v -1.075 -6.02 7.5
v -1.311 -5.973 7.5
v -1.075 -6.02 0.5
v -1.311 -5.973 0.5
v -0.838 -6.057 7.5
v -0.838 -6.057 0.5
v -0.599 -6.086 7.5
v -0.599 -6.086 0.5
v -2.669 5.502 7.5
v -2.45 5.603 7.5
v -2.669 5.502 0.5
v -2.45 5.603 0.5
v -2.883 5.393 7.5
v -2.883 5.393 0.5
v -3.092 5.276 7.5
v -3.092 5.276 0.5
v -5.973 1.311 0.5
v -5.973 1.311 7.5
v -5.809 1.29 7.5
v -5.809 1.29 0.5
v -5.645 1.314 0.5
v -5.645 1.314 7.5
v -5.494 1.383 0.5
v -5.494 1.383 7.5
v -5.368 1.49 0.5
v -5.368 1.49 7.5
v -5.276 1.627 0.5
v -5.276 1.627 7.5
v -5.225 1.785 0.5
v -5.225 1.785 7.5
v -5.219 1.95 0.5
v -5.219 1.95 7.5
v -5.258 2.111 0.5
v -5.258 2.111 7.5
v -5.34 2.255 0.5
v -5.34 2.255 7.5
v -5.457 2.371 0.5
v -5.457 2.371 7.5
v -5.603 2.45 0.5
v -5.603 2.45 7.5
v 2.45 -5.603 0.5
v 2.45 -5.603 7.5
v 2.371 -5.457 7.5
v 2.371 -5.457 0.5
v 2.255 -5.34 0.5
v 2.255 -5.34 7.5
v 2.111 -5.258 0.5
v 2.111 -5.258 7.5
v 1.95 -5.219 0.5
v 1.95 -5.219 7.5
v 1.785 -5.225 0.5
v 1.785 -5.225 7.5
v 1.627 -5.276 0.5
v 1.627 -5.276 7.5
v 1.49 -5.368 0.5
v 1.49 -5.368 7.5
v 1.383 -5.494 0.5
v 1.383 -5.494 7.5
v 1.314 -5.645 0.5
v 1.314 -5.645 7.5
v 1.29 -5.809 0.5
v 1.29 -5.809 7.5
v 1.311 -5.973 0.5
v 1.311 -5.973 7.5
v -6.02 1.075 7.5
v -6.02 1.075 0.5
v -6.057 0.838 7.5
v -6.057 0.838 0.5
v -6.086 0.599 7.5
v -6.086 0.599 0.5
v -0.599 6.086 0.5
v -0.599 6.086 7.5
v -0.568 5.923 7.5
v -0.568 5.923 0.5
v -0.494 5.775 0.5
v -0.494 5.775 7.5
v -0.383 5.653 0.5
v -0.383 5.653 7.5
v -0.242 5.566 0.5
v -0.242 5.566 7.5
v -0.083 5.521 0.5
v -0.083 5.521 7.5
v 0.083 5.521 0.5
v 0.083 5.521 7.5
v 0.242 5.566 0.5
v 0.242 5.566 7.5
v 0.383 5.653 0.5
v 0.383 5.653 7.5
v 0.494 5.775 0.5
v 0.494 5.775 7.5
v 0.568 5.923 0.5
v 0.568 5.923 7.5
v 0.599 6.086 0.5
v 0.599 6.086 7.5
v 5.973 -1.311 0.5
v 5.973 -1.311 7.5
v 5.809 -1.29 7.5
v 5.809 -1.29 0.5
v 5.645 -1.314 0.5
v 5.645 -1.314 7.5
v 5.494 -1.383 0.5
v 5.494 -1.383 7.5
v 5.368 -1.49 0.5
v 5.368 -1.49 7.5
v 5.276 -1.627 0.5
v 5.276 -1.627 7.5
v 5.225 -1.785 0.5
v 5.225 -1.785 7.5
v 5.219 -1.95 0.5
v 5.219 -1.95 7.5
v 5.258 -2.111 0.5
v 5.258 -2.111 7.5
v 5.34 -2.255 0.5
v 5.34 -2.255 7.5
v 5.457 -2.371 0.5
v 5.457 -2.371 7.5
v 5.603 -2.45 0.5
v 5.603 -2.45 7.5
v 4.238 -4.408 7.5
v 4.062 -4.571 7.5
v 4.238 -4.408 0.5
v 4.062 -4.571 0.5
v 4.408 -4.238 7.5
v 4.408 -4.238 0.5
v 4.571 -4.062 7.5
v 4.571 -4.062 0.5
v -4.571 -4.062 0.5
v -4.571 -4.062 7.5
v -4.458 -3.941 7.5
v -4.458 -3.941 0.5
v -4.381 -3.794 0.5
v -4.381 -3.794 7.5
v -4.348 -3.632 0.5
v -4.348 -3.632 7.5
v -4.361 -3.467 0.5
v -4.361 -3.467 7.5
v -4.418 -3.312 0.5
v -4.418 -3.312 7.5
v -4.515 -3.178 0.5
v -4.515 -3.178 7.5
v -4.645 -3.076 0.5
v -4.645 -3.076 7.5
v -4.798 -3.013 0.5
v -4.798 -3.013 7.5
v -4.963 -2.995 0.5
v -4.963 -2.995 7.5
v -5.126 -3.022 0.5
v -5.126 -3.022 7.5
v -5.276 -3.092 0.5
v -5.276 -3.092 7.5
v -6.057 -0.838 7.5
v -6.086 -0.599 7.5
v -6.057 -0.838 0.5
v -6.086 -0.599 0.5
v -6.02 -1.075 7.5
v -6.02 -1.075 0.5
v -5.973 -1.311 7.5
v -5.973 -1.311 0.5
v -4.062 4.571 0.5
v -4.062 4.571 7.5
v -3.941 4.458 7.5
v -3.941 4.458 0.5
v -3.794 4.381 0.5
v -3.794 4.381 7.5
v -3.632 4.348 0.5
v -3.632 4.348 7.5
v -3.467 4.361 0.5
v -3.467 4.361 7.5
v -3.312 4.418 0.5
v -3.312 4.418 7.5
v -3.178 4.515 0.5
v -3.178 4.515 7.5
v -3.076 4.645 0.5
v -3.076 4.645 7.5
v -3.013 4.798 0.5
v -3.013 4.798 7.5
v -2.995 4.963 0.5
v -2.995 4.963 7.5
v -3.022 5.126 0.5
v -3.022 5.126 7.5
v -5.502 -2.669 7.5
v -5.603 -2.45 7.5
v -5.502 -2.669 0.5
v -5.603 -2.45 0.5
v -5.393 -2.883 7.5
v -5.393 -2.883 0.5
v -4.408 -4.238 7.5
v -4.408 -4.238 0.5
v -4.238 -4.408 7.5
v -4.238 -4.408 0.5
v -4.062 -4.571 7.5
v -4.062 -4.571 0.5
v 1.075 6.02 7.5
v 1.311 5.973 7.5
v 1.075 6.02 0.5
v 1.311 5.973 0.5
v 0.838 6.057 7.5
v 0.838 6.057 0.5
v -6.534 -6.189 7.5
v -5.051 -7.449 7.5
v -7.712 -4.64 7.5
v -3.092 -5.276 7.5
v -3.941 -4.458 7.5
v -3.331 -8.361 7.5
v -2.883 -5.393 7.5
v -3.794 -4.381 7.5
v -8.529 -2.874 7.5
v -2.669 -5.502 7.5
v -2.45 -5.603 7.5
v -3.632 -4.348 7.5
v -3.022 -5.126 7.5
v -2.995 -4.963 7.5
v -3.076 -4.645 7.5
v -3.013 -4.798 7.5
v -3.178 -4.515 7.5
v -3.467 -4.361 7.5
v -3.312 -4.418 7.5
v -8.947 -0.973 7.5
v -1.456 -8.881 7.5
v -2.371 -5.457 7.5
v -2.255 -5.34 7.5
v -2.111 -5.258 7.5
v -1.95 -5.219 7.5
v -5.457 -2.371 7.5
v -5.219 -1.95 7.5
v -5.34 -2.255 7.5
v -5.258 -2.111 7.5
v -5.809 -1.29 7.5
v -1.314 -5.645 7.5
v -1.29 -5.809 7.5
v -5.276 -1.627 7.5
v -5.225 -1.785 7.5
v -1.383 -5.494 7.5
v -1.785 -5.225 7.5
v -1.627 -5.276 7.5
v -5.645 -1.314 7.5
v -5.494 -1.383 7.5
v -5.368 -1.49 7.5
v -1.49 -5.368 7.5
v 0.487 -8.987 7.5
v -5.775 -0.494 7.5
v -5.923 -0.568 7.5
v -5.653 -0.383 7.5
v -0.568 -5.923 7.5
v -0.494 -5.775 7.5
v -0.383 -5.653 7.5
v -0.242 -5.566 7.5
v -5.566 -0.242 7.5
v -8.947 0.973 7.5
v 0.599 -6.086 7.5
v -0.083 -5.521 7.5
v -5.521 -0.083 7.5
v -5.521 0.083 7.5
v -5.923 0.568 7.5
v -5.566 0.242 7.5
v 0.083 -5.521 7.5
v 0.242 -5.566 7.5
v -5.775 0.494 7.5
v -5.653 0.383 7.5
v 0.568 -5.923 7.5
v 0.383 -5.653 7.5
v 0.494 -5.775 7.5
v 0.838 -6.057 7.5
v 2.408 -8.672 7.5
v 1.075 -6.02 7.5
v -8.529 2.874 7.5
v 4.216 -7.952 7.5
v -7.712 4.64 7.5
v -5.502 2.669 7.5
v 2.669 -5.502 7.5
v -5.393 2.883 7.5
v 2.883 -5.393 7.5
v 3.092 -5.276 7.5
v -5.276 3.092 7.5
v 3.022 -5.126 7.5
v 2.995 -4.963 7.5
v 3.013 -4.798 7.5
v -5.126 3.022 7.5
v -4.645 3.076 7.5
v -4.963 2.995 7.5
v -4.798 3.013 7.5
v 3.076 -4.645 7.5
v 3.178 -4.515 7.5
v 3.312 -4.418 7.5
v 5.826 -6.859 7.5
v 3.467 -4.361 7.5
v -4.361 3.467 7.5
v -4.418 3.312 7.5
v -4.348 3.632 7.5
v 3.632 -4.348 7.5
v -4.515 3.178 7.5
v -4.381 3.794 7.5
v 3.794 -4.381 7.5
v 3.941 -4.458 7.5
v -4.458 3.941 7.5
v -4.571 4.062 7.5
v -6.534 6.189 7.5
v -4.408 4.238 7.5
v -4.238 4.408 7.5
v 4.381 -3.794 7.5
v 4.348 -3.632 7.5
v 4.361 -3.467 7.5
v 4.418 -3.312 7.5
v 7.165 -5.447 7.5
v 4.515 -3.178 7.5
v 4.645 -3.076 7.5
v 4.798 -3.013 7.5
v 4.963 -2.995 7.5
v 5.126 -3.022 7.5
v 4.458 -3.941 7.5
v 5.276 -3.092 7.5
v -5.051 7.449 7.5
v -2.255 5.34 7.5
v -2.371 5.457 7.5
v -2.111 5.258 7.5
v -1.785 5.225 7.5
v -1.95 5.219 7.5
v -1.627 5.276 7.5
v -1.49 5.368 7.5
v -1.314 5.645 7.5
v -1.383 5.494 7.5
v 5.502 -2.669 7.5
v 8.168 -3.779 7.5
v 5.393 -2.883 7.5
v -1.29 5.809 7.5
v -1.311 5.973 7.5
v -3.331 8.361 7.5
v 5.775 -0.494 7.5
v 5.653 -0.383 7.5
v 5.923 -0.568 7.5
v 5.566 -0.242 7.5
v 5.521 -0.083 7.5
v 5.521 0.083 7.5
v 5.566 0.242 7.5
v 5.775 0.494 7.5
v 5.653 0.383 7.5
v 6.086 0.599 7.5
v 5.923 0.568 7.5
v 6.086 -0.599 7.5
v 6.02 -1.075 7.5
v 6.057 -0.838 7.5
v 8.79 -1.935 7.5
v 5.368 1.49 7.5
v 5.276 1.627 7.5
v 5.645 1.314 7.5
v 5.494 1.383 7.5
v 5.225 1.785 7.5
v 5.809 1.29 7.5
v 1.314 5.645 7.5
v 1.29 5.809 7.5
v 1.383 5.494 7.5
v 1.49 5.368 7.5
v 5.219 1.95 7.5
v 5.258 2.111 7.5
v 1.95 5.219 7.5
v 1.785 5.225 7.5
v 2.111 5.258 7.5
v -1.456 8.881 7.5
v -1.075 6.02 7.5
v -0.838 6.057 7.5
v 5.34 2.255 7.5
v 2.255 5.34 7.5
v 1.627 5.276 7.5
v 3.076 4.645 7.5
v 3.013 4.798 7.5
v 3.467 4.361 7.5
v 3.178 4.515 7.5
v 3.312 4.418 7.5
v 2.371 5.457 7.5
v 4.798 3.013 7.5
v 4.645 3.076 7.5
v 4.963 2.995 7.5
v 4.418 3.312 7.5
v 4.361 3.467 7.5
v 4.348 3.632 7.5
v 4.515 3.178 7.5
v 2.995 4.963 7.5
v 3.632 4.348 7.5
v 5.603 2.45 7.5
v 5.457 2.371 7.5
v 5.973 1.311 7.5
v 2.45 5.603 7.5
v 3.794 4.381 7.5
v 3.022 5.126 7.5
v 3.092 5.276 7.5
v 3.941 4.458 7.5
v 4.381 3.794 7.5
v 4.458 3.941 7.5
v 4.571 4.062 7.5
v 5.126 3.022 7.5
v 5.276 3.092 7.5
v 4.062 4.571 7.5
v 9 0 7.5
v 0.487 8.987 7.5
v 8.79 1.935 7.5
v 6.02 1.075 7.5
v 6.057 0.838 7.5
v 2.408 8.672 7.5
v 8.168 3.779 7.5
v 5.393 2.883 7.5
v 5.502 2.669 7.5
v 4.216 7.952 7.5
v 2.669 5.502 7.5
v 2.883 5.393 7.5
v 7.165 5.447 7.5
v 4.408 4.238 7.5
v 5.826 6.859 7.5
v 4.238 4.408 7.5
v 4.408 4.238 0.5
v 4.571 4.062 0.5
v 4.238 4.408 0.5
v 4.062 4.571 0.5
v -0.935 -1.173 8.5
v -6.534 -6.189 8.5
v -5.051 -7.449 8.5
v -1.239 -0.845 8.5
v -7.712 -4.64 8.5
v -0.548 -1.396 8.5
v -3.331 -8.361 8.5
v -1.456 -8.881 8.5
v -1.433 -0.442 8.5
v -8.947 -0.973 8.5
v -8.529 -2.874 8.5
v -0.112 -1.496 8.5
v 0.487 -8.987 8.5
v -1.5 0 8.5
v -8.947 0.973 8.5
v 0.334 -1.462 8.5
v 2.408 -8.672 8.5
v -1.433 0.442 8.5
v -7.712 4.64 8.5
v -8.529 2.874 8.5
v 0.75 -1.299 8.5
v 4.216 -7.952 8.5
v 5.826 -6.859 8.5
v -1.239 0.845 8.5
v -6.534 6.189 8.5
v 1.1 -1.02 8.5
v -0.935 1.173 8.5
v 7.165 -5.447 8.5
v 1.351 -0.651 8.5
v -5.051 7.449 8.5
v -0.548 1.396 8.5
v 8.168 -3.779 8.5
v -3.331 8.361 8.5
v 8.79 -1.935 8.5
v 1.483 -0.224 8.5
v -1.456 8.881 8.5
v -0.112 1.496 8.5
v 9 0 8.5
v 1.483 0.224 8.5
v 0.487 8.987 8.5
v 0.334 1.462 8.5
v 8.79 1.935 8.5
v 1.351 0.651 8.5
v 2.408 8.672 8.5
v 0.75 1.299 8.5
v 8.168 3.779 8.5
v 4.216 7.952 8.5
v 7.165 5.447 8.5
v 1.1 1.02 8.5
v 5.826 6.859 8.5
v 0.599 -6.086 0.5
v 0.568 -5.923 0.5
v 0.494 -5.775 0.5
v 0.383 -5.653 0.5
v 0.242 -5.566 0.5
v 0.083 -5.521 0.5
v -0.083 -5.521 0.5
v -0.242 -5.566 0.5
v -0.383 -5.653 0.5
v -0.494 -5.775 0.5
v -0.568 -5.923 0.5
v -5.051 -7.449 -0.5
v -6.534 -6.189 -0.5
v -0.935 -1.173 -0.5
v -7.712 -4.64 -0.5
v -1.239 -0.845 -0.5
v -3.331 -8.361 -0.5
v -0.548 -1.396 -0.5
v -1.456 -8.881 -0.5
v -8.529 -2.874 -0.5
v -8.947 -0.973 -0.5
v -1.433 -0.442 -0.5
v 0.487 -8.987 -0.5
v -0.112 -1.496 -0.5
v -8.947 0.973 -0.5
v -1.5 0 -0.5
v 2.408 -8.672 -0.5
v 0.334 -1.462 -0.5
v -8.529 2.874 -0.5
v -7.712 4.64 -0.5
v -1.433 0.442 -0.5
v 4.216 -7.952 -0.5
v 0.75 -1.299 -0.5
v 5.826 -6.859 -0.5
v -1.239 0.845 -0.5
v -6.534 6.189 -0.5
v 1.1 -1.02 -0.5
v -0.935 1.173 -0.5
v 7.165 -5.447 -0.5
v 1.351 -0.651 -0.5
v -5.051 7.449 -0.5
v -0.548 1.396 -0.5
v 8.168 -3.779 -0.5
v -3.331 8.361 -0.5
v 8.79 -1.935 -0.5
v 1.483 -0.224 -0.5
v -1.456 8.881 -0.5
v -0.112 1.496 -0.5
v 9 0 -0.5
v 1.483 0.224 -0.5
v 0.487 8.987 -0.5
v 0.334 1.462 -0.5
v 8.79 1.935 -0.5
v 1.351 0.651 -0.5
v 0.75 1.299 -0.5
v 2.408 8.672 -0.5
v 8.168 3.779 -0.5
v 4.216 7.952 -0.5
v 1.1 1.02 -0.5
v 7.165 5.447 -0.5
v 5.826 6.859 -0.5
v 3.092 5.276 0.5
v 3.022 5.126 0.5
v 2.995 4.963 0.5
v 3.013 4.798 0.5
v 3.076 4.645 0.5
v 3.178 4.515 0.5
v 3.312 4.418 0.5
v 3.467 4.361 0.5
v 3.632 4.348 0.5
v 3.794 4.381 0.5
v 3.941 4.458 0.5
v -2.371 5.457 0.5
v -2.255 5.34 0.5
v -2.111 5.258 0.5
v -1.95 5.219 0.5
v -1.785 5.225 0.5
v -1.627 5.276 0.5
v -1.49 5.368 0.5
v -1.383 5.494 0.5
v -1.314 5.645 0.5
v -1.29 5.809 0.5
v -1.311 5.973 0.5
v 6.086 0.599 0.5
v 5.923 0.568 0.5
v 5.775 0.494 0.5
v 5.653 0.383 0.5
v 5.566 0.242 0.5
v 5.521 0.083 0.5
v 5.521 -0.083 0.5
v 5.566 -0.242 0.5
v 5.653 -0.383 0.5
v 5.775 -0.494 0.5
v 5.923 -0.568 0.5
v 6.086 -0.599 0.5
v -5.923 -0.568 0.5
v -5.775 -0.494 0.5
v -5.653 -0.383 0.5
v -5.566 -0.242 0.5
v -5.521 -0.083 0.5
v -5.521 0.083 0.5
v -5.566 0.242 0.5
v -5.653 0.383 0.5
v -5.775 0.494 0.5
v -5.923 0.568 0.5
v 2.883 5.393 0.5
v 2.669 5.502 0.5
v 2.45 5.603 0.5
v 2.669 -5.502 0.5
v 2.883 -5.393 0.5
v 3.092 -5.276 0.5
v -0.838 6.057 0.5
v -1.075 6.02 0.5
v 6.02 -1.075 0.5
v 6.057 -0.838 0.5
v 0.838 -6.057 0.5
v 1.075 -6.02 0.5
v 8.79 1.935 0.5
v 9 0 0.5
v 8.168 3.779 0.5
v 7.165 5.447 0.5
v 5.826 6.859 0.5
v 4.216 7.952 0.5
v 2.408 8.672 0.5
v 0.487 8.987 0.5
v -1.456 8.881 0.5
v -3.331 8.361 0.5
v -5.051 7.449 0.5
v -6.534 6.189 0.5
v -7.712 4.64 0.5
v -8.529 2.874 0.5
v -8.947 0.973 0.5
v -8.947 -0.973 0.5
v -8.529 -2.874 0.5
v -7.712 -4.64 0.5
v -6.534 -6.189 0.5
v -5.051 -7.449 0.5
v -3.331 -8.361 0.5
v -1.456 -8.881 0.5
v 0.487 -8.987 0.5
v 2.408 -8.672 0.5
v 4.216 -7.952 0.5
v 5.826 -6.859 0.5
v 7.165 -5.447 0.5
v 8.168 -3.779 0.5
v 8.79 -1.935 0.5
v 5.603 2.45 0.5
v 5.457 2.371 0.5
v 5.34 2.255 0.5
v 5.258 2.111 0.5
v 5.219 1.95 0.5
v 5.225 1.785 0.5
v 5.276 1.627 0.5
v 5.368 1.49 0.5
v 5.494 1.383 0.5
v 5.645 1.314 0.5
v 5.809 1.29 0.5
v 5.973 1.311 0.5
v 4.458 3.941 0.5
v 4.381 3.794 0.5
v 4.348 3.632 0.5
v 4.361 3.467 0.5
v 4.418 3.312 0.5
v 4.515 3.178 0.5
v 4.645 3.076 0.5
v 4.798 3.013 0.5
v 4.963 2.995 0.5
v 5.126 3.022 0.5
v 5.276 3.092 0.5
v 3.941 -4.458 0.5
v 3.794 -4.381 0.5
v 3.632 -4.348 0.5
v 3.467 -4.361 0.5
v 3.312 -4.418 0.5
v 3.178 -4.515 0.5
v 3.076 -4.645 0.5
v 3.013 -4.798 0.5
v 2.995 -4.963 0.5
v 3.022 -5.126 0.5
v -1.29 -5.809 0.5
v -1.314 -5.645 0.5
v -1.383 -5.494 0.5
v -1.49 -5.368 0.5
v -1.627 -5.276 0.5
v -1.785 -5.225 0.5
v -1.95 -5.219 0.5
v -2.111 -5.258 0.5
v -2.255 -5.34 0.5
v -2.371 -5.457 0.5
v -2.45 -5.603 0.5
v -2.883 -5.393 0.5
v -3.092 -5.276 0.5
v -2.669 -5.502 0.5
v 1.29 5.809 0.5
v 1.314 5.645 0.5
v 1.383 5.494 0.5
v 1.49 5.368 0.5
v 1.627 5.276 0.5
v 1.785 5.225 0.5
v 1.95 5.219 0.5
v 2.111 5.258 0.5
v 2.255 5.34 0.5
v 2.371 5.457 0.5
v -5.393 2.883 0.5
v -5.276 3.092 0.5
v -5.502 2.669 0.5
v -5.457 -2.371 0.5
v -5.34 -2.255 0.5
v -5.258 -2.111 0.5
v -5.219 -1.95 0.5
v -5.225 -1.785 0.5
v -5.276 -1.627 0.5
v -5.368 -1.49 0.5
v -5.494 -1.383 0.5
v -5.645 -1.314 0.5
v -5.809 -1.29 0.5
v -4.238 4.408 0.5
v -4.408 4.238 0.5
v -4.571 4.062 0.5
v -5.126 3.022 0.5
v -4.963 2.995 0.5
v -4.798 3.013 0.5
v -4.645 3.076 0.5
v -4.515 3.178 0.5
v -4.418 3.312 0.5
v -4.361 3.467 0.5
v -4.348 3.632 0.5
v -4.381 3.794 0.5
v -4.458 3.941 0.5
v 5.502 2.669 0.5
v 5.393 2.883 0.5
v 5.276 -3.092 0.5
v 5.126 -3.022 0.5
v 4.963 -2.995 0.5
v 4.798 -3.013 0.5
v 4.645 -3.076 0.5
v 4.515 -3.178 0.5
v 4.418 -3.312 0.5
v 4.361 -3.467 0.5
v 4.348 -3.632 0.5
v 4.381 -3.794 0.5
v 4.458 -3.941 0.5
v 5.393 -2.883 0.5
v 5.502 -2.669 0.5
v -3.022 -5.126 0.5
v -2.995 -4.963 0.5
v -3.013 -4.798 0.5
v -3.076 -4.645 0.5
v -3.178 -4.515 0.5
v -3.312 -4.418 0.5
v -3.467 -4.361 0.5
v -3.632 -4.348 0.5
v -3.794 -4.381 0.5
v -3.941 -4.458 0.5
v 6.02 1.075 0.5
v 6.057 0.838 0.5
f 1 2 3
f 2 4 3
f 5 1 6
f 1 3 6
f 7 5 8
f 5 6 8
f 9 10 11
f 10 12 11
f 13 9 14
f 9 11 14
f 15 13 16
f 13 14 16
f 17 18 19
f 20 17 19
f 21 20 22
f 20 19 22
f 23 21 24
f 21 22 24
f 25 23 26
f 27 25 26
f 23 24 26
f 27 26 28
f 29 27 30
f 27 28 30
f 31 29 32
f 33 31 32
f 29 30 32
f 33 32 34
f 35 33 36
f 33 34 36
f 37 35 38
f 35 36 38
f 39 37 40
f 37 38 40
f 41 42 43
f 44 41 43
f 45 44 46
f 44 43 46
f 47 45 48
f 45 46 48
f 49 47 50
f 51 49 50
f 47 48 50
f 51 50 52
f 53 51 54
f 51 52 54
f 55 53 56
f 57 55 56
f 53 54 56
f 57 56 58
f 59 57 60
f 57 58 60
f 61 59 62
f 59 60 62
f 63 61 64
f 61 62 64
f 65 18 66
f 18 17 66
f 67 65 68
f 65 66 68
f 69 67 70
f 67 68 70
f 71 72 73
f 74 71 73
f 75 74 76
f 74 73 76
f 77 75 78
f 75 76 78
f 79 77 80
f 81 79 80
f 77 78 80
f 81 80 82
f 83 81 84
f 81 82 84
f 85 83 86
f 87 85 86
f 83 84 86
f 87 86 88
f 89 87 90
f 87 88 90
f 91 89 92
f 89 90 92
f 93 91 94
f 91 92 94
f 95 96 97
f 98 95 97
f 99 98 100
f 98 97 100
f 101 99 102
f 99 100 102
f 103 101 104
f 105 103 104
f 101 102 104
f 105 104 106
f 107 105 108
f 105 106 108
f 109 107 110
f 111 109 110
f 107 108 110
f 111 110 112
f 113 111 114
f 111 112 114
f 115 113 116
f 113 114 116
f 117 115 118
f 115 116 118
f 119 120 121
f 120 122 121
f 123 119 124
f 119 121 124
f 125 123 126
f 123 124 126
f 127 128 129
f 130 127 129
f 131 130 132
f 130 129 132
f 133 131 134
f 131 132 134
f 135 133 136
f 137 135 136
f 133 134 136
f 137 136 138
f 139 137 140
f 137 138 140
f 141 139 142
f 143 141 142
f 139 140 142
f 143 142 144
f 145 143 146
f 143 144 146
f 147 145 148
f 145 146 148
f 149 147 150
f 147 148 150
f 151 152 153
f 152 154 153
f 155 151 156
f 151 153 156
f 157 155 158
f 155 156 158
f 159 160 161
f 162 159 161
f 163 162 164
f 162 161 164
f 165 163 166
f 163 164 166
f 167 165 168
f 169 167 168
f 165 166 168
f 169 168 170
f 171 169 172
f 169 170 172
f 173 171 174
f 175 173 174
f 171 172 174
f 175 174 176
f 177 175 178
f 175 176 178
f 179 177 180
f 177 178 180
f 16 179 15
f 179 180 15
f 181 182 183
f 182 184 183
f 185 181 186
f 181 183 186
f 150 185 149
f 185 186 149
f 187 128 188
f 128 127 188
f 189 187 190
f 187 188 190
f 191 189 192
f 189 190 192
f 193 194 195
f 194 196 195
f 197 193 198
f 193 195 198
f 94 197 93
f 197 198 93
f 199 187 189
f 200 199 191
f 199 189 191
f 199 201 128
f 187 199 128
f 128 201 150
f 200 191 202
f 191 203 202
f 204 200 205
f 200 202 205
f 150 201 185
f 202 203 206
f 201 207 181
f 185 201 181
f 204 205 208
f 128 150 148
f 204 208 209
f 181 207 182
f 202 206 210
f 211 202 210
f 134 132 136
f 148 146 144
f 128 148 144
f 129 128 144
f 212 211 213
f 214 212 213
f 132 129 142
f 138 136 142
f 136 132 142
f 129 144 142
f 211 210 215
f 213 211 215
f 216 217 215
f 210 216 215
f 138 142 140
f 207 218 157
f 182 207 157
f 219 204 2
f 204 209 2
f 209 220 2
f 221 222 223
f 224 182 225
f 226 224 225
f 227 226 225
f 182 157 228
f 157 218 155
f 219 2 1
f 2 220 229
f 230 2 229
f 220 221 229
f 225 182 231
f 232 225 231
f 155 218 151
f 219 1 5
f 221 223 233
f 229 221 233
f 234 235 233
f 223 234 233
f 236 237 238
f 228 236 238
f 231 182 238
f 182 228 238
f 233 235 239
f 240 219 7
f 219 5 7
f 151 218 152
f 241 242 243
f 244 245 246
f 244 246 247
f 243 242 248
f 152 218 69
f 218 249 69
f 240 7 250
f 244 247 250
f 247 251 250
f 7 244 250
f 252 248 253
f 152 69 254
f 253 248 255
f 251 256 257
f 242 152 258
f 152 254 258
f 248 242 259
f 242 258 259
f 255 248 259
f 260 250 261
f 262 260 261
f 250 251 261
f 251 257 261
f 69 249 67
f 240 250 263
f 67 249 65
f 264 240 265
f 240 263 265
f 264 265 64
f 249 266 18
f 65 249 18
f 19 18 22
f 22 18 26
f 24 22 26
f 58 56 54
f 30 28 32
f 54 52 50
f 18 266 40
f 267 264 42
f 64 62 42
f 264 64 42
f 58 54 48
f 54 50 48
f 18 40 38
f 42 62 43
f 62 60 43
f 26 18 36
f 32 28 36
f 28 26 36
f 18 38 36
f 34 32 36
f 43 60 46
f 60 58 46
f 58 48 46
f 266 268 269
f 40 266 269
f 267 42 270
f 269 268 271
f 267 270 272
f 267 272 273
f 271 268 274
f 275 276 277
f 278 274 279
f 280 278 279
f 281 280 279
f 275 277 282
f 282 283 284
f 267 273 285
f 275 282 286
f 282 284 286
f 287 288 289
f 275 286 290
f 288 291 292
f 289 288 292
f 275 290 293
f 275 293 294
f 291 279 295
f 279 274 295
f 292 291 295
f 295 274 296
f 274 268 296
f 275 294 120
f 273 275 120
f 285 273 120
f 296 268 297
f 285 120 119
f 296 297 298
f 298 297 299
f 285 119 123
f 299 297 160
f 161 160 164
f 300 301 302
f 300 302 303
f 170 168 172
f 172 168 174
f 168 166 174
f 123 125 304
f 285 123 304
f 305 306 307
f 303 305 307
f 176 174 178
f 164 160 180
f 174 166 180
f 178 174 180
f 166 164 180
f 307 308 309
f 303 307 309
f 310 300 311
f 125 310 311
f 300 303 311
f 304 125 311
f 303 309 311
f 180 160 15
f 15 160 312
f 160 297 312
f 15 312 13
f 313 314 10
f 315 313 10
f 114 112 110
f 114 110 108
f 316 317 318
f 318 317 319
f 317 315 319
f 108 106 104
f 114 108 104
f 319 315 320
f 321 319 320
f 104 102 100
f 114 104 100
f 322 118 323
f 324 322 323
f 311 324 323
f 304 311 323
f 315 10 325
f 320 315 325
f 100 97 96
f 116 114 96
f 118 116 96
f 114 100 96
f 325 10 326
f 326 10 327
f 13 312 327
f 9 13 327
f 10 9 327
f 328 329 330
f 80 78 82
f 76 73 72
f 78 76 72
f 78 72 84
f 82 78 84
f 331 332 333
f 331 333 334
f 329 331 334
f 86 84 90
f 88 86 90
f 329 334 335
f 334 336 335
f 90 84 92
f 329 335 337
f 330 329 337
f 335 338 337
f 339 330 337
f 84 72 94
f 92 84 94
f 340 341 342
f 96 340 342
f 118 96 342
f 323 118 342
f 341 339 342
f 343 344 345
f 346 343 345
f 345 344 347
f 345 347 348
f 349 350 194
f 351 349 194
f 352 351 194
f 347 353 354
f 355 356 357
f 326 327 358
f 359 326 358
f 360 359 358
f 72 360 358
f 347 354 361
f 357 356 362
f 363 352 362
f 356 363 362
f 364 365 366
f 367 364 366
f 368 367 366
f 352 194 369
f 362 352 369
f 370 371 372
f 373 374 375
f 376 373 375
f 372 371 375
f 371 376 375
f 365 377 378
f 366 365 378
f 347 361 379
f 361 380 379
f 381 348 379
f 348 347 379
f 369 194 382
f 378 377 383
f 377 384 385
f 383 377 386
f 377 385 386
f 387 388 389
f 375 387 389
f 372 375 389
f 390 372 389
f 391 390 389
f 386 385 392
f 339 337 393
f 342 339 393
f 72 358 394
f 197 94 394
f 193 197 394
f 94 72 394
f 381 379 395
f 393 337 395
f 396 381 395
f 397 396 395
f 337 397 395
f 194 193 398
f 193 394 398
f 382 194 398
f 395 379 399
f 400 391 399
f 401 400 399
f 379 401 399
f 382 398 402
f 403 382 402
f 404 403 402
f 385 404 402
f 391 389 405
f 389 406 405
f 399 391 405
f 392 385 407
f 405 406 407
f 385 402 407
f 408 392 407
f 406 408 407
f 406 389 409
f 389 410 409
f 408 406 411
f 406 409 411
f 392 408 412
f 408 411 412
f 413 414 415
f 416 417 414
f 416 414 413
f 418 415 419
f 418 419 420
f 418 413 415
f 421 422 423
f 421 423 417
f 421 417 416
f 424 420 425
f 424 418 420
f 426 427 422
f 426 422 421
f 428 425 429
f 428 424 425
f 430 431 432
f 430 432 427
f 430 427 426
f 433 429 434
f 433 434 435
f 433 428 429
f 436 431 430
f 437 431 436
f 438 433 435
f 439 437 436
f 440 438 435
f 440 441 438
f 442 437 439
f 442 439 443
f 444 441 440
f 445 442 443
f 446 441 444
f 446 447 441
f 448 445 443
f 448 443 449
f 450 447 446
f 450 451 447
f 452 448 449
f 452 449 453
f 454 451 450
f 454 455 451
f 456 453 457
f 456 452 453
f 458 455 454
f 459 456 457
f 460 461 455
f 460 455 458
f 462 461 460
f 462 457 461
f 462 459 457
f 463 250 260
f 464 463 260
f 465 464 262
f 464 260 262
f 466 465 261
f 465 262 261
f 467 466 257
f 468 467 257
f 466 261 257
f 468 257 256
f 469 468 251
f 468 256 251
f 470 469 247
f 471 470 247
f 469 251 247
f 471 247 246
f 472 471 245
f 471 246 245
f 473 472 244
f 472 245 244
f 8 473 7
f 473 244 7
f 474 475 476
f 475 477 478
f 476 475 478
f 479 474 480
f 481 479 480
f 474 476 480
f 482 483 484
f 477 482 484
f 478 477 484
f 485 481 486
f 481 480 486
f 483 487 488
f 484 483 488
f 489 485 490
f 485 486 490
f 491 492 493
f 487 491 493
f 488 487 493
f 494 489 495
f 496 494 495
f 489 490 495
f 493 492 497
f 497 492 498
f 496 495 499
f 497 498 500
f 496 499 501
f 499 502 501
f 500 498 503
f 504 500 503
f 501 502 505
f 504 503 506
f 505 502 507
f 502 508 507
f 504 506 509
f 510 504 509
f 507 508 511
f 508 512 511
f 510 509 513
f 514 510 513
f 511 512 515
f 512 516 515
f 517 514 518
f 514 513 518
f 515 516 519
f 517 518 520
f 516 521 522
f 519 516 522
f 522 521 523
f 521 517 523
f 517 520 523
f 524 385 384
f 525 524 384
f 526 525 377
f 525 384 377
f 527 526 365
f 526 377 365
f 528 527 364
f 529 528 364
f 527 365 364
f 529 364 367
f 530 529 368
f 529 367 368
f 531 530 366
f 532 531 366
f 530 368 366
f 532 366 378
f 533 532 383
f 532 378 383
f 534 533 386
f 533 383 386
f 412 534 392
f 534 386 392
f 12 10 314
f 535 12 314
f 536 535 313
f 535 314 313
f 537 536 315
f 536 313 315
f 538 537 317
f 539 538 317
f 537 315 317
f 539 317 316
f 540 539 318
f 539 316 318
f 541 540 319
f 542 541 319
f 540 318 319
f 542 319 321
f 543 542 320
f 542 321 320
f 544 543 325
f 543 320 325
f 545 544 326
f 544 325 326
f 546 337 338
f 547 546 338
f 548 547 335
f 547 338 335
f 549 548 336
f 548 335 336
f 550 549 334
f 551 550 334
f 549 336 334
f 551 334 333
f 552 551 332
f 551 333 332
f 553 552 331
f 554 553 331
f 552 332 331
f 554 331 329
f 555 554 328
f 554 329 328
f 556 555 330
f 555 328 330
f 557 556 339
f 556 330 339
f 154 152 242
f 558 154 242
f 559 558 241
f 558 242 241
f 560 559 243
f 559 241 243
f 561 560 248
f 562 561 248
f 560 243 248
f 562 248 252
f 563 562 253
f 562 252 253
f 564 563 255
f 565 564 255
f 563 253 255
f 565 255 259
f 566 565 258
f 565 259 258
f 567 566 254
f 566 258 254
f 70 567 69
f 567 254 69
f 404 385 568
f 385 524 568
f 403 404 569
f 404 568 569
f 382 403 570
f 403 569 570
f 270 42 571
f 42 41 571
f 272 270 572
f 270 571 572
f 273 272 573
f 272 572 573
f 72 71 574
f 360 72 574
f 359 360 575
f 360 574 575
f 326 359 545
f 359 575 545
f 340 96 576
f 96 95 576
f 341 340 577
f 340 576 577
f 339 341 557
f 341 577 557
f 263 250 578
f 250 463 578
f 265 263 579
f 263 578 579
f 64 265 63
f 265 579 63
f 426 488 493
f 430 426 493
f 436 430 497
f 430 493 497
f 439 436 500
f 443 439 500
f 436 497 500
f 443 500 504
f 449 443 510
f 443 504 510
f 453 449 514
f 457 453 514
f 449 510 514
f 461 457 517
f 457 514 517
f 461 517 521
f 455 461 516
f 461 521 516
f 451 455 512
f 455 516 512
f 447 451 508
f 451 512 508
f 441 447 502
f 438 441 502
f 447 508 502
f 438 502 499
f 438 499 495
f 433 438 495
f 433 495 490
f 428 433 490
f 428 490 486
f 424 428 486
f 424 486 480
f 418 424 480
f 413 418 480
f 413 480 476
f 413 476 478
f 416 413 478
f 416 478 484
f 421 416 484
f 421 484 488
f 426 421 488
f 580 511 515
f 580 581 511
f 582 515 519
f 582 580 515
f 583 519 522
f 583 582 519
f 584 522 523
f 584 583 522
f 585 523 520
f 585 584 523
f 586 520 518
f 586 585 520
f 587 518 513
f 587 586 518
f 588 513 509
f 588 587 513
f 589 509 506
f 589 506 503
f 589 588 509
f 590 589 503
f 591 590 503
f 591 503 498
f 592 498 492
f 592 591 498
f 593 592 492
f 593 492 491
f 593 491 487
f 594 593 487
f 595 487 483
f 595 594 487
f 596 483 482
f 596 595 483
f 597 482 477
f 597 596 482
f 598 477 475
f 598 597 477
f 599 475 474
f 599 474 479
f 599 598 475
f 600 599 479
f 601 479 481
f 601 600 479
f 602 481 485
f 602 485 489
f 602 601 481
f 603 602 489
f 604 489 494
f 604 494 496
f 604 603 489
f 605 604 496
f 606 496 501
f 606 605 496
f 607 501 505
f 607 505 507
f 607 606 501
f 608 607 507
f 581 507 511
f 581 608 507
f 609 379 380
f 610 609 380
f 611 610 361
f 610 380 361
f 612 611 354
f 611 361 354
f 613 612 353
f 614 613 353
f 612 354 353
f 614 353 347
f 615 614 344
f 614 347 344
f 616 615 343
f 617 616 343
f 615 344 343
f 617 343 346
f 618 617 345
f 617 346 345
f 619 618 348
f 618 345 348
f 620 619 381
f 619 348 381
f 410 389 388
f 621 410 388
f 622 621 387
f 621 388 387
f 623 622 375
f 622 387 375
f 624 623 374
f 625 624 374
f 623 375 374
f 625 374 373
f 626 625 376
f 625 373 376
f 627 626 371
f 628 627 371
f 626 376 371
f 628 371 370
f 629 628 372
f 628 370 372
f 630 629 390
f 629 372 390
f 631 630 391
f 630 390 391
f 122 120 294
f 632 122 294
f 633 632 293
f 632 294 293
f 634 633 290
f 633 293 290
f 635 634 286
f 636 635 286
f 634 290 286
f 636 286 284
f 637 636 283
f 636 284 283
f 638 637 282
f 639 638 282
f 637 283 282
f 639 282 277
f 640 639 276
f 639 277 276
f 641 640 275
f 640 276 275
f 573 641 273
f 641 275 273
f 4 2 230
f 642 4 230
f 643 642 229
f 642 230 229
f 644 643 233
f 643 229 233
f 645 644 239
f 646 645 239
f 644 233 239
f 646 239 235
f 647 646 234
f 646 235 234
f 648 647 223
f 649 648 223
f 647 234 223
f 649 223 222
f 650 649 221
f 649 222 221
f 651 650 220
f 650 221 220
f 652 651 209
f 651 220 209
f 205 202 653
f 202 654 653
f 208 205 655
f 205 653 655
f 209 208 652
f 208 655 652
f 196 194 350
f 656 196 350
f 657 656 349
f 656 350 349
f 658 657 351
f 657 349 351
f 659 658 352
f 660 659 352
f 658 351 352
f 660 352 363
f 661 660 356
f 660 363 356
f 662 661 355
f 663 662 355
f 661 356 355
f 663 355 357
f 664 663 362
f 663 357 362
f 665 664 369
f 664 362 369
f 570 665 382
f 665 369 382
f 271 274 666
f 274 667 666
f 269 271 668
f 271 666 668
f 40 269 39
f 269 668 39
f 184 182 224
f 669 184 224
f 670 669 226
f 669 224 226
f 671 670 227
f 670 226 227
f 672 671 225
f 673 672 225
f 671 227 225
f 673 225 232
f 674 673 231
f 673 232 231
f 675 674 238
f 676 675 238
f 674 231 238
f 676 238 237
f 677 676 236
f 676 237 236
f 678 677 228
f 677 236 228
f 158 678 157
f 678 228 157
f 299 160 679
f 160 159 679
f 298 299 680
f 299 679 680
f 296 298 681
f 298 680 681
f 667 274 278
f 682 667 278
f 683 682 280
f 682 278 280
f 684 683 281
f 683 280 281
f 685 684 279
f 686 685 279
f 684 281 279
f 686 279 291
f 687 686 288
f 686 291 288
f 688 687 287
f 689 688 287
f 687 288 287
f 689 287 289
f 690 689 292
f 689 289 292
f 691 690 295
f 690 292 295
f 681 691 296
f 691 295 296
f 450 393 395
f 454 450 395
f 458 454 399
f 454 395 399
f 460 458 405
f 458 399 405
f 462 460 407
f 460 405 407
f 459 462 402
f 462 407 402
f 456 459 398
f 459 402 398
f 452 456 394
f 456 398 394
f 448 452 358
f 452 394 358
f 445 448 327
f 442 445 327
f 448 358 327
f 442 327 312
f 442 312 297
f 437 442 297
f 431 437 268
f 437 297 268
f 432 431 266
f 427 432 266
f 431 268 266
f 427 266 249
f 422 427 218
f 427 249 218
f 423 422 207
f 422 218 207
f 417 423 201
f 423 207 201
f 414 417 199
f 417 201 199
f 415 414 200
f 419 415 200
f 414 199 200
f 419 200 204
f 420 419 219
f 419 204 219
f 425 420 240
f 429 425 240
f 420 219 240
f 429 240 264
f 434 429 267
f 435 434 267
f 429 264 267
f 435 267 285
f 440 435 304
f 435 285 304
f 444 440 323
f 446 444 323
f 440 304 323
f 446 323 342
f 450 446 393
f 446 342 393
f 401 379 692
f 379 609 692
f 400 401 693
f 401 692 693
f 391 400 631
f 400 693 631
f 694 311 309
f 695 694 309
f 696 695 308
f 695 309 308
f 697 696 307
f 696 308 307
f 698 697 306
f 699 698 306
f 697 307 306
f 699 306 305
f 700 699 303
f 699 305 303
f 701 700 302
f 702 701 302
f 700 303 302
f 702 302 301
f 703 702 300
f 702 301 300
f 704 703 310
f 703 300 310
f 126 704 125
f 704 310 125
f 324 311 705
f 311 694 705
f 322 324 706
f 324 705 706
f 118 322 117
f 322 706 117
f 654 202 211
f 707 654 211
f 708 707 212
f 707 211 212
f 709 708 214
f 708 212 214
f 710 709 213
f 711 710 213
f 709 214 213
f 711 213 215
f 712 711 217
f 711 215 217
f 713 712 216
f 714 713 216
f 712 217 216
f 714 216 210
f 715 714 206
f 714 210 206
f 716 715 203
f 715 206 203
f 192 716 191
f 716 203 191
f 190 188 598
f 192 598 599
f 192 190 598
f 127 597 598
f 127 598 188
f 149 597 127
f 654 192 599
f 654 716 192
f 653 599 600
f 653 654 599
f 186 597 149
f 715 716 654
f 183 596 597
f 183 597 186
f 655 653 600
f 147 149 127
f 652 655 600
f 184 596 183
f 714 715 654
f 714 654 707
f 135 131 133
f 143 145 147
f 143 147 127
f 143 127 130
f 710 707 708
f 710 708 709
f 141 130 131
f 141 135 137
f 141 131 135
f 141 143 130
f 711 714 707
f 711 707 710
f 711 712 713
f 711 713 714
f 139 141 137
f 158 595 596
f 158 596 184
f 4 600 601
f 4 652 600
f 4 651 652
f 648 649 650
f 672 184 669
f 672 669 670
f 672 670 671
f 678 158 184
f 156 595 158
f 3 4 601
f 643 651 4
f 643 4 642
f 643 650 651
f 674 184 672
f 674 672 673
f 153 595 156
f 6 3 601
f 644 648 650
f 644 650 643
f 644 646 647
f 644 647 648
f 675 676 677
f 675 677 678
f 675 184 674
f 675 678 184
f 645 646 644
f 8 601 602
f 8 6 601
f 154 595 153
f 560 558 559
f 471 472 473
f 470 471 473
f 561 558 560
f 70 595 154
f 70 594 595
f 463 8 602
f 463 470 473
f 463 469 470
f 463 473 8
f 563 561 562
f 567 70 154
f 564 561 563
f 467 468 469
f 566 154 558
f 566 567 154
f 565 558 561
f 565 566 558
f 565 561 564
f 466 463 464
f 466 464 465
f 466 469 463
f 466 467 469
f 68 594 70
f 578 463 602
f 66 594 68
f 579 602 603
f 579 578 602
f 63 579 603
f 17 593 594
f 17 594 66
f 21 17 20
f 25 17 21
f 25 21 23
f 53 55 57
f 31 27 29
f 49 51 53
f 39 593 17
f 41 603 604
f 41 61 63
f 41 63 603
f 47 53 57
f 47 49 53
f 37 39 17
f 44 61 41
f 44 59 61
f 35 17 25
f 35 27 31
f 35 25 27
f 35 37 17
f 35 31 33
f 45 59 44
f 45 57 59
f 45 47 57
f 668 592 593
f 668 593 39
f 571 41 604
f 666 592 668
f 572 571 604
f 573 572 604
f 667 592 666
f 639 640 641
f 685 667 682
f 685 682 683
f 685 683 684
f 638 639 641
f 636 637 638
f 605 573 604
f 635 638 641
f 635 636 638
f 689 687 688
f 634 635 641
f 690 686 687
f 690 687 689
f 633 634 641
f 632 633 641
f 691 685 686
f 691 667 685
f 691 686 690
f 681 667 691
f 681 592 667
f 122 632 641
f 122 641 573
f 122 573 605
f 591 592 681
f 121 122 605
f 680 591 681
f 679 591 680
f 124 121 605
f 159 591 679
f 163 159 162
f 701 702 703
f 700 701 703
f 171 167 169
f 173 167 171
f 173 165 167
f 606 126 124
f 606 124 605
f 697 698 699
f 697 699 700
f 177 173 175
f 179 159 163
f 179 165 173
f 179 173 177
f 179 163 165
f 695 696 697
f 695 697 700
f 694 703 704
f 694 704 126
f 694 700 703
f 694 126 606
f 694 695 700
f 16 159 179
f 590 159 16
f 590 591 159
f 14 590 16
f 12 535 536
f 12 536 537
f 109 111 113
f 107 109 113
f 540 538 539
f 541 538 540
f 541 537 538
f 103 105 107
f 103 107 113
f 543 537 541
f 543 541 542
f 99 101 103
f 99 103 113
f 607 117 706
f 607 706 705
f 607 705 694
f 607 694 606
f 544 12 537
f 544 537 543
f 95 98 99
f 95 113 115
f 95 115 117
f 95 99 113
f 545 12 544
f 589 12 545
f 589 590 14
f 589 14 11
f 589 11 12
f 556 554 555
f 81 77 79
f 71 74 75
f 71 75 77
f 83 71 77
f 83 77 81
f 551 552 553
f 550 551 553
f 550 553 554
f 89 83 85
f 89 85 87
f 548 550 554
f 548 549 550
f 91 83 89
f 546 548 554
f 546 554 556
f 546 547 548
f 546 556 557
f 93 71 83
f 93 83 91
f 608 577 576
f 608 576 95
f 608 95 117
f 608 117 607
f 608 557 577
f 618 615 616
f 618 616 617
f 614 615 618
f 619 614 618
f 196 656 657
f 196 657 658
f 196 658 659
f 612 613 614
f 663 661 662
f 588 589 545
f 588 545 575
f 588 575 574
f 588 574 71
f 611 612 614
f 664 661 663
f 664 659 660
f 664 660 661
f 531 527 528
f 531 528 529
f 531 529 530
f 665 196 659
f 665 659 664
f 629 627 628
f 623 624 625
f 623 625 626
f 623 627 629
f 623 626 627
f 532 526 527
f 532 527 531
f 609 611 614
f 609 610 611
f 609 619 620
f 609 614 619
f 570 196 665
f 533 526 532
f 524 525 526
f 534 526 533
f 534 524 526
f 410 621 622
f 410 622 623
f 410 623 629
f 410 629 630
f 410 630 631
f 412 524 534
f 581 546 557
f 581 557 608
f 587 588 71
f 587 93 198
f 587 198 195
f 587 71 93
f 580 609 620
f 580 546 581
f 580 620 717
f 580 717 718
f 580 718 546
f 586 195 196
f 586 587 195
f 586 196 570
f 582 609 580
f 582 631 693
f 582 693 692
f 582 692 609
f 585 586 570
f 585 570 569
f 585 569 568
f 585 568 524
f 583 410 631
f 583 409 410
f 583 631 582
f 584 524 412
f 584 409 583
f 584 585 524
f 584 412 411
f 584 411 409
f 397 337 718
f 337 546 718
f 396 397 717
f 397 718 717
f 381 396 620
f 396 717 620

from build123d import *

# Parameters (mm, degrees)
SKETCH_1_R               = 9
EXTRUDE_1_DEPTH          = 0.5
SKETCH_2_R               = 6.115
EXTRUDE_2_DEPTH          = 7
CUT_EXTRUDE_3_DEPTH      = 7
SKETCH_3_R               = 9
EXTRUDE_3_DEPTH          = 1
SKETCH_6_R               = 1.5
CUT_EXTRUDE_2_DEPTH      = 10
PATTERN_CIRCULAR_2_COUNT = 20


with BuildPart() as part:
    # 草圖1 → 填料-伸長1 (new body, symmetric)
    with BuildSketch(Plane.XY):
        Circle(SKETCH_1_R)
    extrude(amount=EXTRUDE_1_DEPTH, both=True)

    # 草圖2 → 填料-伸長2 (add)
    with BuildSketch(Plane.XY.offset(0.5)):
        Circle(SKETCH_2_R)
    extrude(amount=EXTRUDE_2_DEPTH)

    # 草圖7 → 除料-伸長3 (cut)
    with BuildSketch(Plane.XY.offset(7.5)):
        with BuildLine():
            ThreePointArc((-0.599277509, 6.085564186), (0, 5.515), (0.599277509, 6.085564186))
            ThreePointArc((0.599277509, 6.085564186), (0, 6.115), (-0.599277509, 6.085564186))
        make_face()
    cut_extrude_3 = extrude(amount=-CUT_EXTRUDE_3_DEPTH, mode=Mode.SUBTRACT)

    # 草圖3 → 填料-伸長3 (add)
    with BuildSketch(Plane.XY.offset(7.5)):
        Circle(SKETCH_3_R)
    extrude(amount=EXTRUDE_3_DEPTH)

    # 草圖6 → 除料-伸長2 (cut, through all)
    with BuildSketch(Plane(origin=(0, 0, -0.5), x_dir=(-1, 0, 0), z_dir=(0, 0, -1))):
        Circle(SKETCH_6_R)
    extrude(amount=-CUT_EXTRUDE_2_DEPTH, mode=Mode.SUBTRACT)

    # 環狀複製排列2: 除料-伸長3 ×20 about axis
    pattern_circular_2_axis = Axis((0, 0, 0), (0, 0, 1))
    for i in range(1, PATTERN_CIRCULAR_2_COUNT):
        add(cut_extrude_3.rotate(pattern_circular_2_axis, i * 360 / PATTERN_CIRCULAR_2_COUNT), mode=Mode.SUBTRACT)


solid = part.part
